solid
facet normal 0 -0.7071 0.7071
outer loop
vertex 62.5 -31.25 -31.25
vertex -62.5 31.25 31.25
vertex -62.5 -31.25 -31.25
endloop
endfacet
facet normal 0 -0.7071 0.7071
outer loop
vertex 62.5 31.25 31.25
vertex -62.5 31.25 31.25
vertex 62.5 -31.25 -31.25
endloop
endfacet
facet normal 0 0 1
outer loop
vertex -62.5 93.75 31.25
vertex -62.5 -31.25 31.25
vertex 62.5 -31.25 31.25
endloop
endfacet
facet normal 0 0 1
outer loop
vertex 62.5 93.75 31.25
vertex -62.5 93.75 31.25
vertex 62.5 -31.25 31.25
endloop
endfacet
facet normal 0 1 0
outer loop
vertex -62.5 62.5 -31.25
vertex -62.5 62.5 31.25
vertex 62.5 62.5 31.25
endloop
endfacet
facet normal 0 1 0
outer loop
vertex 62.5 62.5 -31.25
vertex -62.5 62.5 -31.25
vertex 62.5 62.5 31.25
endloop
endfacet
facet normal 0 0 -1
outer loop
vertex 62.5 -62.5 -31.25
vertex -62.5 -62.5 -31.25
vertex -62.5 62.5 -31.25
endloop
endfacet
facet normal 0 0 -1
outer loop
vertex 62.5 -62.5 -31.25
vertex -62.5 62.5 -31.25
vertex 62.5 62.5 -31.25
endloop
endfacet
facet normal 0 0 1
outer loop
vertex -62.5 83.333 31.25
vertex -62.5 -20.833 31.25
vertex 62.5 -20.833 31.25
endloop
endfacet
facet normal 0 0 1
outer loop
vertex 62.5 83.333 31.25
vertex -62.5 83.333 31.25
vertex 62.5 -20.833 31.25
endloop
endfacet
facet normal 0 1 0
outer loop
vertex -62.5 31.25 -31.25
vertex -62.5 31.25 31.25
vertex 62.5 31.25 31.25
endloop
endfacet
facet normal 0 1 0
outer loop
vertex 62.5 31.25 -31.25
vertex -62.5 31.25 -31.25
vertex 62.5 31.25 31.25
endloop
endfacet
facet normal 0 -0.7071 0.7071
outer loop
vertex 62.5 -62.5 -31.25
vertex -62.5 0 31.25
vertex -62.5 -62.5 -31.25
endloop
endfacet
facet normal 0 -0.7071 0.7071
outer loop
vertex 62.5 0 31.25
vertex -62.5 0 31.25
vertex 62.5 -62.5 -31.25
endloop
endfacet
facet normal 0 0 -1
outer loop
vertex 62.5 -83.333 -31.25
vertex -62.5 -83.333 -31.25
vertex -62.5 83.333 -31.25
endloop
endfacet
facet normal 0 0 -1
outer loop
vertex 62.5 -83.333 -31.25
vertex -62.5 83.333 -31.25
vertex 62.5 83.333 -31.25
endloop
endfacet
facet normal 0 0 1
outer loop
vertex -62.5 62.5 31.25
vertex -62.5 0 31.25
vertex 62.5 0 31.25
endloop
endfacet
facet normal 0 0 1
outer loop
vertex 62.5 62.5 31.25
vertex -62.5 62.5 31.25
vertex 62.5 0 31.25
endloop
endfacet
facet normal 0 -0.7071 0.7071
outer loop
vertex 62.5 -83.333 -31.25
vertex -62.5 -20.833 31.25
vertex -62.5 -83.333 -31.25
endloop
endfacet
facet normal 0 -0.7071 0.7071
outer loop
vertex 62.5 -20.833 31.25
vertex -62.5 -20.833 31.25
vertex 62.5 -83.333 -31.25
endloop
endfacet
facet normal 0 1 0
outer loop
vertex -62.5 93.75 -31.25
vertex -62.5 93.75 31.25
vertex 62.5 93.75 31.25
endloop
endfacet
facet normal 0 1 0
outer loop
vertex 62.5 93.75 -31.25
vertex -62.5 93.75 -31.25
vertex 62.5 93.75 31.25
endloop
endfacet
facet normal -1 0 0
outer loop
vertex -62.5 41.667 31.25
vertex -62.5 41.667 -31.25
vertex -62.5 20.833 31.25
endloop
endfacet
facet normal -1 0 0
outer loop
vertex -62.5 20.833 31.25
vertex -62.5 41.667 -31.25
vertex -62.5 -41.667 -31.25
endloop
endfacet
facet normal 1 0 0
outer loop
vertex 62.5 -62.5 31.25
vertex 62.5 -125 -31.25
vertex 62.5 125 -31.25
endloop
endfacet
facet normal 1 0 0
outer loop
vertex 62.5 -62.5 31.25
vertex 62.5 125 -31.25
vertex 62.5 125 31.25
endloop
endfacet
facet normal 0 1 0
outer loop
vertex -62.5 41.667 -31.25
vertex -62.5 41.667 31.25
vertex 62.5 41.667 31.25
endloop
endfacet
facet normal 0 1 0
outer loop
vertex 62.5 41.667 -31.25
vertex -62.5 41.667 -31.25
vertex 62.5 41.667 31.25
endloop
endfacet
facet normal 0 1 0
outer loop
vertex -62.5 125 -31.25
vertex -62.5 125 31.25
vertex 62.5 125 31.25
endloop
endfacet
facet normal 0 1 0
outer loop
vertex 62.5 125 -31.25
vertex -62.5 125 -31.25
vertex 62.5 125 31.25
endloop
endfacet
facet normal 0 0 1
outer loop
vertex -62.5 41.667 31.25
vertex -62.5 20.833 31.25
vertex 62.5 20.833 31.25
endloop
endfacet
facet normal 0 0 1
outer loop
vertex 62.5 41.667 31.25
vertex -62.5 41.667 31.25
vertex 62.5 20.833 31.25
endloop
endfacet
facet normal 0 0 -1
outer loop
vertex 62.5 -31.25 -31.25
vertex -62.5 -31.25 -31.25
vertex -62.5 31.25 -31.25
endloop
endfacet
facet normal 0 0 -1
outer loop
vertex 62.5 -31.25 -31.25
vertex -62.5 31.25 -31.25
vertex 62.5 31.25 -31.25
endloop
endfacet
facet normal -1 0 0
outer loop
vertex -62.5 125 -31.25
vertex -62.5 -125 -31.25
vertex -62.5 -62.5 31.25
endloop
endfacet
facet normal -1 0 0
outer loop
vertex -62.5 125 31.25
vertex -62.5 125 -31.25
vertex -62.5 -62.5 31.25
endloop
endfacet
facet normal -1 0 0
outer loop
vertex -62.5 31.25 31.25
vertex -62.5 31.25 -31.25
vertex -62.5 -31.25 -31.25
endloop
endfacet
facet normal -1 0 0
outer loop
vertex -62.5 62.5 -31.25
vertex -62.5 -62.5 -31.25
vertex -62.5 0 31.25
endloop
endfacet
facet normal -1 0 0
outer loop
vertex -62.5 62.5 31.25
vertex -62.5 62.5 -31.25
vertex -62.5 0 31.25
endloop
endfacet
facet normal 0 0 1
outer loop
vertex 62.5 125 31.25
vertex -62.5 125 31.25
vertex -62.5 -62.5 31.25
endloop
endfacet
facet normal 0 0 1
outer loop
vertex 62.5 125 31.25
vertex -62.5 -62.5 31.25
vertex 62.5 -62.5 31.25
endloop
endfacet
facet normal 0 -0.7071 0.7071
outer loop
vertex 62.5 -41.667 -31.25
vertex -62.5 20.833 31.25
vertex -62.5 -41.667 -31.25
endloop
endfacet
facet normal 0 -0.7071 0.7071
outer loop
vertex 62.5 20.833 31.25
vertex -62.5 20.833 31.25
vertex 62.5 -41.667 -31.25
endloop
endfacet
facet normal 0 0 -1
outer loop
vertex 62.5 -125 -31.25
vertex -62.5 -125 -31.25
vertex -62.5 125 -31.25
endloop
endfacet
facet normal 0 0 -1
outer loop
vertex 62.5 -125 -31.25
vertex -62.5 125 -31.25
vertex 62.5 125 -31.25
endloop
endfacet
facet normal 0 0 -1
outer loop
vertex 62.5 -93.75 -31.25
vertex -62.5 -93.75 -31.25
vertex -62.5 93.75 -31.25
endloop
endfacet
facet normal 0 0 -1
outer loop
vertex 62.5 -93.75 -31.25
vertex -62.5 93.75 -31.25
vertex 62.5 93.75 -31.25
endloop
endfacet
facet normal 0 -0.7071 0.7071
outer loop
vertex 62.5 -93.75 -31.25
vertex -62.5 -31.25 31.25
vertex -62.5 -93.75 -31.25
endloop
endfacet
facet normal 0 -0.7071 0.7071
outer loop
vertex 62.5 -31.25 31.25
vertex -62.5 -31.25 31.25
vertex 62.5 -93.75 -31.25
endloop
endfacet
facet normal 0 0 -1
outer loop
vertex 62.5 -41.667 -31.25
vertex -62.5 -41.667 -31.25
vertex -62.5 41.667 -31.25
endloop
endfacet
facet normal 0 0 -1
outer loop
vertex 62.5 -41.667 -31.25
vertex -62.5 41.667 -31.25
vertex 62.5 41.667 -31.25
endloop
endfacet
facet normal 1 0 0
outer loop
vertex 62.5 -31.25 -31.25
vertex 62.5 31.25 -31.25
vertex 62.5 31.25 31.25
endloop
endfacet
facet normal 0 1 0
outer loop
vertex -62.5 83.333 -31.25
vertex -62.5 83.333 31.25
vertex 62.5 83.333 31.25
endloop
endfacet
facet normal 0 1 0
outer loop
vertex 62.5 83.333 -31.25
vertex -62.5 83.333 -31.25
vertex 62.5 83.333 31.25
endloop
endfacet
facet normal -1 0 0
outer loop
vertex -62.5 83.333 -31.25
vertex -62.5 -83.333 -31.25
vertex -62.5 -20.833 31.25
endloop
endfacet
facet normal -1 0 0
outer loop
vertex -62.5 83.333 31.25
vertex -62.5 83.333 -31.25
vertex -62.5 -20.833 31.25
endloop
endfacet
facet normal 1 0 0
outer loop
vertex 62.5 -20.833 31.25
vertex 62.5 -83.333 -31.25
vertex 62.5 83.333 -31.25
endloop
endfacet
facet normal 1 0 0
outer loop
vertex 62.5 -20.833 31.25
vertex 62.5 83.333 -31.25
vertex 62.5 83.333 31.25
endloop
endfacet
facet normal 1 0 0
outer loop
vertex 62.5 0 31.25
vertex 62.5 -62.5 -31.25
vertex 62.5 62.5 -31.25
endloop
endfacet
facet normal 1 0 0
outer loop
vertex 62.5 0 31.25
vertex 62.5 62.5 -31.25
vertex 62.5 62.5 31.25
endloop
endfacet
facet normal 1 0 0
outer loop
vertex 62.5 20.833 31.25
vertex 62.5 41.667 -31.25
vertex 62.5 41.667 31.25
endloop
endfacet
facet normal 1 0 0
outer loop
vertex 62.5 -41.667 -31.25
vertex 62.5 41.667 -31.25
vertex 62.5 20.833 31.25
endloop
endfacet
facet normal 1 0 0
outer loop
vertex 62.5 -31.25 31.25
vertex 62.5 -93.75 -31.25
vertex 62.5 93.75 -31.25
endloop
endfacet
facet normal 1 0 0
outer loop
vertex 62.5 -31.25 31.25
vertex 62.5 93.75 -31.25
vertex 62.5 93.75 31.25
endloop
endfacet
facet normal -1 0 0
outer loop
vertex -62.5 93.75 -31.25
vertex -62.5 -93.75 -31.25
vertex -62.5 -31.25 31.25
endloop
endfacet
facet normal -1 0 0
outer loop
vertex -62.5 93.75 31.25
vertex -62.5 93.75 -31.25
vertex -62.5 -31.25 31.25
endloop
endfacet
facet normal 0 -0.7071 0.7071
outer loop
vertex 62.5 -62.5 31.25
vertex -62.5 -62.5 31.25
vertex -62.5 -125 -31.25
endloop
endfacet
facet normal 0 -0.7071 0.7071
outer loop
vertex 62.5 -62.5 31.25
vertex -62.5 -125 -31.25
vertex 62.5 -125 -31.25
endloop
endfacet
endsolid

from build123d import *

# Parameters (mm, degrees)
F0_W     = 125
F0_H     = 62.5
F1_DEPTH = 125
F2_DEPTH = 62.5
F3_DEPTH = 93.75
F4_DEPTH = 31.25
F5_DEPTH = 83.3333333333
F6_DEPTH = 41.6666666667
F7_SIZE2 = 62.49999
F7_SIZE  = 62.49999
F8_SIZE  = 62.49999
F9_SIZE  = 62.49999
F10_SIZE = 62.49999
F11_SIZE = 62.49999
F12_SIZE = 62.49999


# Not quite as in the source:
# - a fillet or chamfer is up to 0.001 mm smaller than in the source, because OpenCascade refuses the exact size


with BuildPart() as f1:
    # F0 (on Front) → F1 (new body, symmetric)
    with BuildSketch(Plane.XZ):
        Rectangle(F0_W, F0_H)
    extrude(amount=F1_DEPTH, both=True)

    # F7 (size 62.5 and 62.5 in the source; OpenCascade refuses exactly that, so slightly less here)
    f7_edges = [f1.edges().sort_by_distance(p)[0] for p in [
        (0, -125, 31.25),
    ]]
    chamfer(f7_edges, length=F7_SIZE, length2=F7_SIZE2)


with BuildPart() as f2:
    # F0 (on Front) → F2 (new body, symmetric)
    with BuildSketch(Plane.XZ):
        Rectangle(F0_W, F0_H)
    extrude(amount=F2_DEPTH, both=True)

    # F8 (size 62.5 in the source; OpenCascade refuses exactly that, so slightly less here)
    f8_edges = [f2.edges().sort_by_distance(p)[0] for p in [
        (0, -62.5, 31.25),
    ]]
    chamfer(f8_edges, length=F8_SIZE)


with BuildPart() as f3:
    # F0 (on Front) → F3 (new body, symmetric)
    with BuildSketch(Plane.XZ):
        Rectangle(F0_W, F0_H)
    extrude(amount=F3_DEPTH, both=True)

    # F9 (size 62.5 in the source; OpenCascade refuses exactly that, so slightly less here)
    f9_edges = [f3.edges().sort_by_distance(p)[0] for p in [
        (0, -93.75, 31.25),
    ]]
    chamfer(f9_edges, length=F9_SIZE)


with BuildPart() as f4:
    # F0 (on Front) → F4 (new body, symmetric)
    with BuildSketch(Plane.XZ):
        Rectangle(F0_W, F0_H)
    extrude(amount=F4_DEPTH, both=True)

    # F11 (size 62.5 in the source; OpenCascade refuses exactly that, so slightly less here)
    f11_edges = [f4.edges().sort_by_distance(p)[0] for p in [
        (0, -31.25, 31.25),
    ]]
    chamfer(f11_edges, length=F11_SIZE)


with BuildPart() as f5:
    # F0 (on Front) → F5 (new body, symmetric)
    with BuildSketch(Plane.XZ):
        Rectangle(F0_W, F0_H)
    extrude(amount=F5_DEPTH, both=True)

    # F10 (size 62.5 in the source; OpenCascade refuses exactly that, so slightly less here)
    f10_edges = [f5.edges().sort_by_distance(p)[0] for p in [
        (0, -83.333333, 31.25),
    ]]
    chamfer(f10_edges, length=F10_SIZE)


with BuildPart() as f6:
    # F0 (on Front) → F6 (new body, symmetric)
    with BuildSketch(Plane.XZ):
        Rectangle(F0_W, F0_H)
    extrude(amount=F6_DEPTH, both=True)

    # F12 (size 62.5 in the source; OpenCascade refuses exactly that, so slightly less here)
    f12_edges = [f6.edges().sort_by_distance(p)[0] for p in [
        (0, -41.666667, 31.25),
    ]]
    chamfer(f12_edges, length=F12_SIZE)


solid = Compound([f1.part, f2.part, f3.part, f4.part, f5.part, f6.part])
